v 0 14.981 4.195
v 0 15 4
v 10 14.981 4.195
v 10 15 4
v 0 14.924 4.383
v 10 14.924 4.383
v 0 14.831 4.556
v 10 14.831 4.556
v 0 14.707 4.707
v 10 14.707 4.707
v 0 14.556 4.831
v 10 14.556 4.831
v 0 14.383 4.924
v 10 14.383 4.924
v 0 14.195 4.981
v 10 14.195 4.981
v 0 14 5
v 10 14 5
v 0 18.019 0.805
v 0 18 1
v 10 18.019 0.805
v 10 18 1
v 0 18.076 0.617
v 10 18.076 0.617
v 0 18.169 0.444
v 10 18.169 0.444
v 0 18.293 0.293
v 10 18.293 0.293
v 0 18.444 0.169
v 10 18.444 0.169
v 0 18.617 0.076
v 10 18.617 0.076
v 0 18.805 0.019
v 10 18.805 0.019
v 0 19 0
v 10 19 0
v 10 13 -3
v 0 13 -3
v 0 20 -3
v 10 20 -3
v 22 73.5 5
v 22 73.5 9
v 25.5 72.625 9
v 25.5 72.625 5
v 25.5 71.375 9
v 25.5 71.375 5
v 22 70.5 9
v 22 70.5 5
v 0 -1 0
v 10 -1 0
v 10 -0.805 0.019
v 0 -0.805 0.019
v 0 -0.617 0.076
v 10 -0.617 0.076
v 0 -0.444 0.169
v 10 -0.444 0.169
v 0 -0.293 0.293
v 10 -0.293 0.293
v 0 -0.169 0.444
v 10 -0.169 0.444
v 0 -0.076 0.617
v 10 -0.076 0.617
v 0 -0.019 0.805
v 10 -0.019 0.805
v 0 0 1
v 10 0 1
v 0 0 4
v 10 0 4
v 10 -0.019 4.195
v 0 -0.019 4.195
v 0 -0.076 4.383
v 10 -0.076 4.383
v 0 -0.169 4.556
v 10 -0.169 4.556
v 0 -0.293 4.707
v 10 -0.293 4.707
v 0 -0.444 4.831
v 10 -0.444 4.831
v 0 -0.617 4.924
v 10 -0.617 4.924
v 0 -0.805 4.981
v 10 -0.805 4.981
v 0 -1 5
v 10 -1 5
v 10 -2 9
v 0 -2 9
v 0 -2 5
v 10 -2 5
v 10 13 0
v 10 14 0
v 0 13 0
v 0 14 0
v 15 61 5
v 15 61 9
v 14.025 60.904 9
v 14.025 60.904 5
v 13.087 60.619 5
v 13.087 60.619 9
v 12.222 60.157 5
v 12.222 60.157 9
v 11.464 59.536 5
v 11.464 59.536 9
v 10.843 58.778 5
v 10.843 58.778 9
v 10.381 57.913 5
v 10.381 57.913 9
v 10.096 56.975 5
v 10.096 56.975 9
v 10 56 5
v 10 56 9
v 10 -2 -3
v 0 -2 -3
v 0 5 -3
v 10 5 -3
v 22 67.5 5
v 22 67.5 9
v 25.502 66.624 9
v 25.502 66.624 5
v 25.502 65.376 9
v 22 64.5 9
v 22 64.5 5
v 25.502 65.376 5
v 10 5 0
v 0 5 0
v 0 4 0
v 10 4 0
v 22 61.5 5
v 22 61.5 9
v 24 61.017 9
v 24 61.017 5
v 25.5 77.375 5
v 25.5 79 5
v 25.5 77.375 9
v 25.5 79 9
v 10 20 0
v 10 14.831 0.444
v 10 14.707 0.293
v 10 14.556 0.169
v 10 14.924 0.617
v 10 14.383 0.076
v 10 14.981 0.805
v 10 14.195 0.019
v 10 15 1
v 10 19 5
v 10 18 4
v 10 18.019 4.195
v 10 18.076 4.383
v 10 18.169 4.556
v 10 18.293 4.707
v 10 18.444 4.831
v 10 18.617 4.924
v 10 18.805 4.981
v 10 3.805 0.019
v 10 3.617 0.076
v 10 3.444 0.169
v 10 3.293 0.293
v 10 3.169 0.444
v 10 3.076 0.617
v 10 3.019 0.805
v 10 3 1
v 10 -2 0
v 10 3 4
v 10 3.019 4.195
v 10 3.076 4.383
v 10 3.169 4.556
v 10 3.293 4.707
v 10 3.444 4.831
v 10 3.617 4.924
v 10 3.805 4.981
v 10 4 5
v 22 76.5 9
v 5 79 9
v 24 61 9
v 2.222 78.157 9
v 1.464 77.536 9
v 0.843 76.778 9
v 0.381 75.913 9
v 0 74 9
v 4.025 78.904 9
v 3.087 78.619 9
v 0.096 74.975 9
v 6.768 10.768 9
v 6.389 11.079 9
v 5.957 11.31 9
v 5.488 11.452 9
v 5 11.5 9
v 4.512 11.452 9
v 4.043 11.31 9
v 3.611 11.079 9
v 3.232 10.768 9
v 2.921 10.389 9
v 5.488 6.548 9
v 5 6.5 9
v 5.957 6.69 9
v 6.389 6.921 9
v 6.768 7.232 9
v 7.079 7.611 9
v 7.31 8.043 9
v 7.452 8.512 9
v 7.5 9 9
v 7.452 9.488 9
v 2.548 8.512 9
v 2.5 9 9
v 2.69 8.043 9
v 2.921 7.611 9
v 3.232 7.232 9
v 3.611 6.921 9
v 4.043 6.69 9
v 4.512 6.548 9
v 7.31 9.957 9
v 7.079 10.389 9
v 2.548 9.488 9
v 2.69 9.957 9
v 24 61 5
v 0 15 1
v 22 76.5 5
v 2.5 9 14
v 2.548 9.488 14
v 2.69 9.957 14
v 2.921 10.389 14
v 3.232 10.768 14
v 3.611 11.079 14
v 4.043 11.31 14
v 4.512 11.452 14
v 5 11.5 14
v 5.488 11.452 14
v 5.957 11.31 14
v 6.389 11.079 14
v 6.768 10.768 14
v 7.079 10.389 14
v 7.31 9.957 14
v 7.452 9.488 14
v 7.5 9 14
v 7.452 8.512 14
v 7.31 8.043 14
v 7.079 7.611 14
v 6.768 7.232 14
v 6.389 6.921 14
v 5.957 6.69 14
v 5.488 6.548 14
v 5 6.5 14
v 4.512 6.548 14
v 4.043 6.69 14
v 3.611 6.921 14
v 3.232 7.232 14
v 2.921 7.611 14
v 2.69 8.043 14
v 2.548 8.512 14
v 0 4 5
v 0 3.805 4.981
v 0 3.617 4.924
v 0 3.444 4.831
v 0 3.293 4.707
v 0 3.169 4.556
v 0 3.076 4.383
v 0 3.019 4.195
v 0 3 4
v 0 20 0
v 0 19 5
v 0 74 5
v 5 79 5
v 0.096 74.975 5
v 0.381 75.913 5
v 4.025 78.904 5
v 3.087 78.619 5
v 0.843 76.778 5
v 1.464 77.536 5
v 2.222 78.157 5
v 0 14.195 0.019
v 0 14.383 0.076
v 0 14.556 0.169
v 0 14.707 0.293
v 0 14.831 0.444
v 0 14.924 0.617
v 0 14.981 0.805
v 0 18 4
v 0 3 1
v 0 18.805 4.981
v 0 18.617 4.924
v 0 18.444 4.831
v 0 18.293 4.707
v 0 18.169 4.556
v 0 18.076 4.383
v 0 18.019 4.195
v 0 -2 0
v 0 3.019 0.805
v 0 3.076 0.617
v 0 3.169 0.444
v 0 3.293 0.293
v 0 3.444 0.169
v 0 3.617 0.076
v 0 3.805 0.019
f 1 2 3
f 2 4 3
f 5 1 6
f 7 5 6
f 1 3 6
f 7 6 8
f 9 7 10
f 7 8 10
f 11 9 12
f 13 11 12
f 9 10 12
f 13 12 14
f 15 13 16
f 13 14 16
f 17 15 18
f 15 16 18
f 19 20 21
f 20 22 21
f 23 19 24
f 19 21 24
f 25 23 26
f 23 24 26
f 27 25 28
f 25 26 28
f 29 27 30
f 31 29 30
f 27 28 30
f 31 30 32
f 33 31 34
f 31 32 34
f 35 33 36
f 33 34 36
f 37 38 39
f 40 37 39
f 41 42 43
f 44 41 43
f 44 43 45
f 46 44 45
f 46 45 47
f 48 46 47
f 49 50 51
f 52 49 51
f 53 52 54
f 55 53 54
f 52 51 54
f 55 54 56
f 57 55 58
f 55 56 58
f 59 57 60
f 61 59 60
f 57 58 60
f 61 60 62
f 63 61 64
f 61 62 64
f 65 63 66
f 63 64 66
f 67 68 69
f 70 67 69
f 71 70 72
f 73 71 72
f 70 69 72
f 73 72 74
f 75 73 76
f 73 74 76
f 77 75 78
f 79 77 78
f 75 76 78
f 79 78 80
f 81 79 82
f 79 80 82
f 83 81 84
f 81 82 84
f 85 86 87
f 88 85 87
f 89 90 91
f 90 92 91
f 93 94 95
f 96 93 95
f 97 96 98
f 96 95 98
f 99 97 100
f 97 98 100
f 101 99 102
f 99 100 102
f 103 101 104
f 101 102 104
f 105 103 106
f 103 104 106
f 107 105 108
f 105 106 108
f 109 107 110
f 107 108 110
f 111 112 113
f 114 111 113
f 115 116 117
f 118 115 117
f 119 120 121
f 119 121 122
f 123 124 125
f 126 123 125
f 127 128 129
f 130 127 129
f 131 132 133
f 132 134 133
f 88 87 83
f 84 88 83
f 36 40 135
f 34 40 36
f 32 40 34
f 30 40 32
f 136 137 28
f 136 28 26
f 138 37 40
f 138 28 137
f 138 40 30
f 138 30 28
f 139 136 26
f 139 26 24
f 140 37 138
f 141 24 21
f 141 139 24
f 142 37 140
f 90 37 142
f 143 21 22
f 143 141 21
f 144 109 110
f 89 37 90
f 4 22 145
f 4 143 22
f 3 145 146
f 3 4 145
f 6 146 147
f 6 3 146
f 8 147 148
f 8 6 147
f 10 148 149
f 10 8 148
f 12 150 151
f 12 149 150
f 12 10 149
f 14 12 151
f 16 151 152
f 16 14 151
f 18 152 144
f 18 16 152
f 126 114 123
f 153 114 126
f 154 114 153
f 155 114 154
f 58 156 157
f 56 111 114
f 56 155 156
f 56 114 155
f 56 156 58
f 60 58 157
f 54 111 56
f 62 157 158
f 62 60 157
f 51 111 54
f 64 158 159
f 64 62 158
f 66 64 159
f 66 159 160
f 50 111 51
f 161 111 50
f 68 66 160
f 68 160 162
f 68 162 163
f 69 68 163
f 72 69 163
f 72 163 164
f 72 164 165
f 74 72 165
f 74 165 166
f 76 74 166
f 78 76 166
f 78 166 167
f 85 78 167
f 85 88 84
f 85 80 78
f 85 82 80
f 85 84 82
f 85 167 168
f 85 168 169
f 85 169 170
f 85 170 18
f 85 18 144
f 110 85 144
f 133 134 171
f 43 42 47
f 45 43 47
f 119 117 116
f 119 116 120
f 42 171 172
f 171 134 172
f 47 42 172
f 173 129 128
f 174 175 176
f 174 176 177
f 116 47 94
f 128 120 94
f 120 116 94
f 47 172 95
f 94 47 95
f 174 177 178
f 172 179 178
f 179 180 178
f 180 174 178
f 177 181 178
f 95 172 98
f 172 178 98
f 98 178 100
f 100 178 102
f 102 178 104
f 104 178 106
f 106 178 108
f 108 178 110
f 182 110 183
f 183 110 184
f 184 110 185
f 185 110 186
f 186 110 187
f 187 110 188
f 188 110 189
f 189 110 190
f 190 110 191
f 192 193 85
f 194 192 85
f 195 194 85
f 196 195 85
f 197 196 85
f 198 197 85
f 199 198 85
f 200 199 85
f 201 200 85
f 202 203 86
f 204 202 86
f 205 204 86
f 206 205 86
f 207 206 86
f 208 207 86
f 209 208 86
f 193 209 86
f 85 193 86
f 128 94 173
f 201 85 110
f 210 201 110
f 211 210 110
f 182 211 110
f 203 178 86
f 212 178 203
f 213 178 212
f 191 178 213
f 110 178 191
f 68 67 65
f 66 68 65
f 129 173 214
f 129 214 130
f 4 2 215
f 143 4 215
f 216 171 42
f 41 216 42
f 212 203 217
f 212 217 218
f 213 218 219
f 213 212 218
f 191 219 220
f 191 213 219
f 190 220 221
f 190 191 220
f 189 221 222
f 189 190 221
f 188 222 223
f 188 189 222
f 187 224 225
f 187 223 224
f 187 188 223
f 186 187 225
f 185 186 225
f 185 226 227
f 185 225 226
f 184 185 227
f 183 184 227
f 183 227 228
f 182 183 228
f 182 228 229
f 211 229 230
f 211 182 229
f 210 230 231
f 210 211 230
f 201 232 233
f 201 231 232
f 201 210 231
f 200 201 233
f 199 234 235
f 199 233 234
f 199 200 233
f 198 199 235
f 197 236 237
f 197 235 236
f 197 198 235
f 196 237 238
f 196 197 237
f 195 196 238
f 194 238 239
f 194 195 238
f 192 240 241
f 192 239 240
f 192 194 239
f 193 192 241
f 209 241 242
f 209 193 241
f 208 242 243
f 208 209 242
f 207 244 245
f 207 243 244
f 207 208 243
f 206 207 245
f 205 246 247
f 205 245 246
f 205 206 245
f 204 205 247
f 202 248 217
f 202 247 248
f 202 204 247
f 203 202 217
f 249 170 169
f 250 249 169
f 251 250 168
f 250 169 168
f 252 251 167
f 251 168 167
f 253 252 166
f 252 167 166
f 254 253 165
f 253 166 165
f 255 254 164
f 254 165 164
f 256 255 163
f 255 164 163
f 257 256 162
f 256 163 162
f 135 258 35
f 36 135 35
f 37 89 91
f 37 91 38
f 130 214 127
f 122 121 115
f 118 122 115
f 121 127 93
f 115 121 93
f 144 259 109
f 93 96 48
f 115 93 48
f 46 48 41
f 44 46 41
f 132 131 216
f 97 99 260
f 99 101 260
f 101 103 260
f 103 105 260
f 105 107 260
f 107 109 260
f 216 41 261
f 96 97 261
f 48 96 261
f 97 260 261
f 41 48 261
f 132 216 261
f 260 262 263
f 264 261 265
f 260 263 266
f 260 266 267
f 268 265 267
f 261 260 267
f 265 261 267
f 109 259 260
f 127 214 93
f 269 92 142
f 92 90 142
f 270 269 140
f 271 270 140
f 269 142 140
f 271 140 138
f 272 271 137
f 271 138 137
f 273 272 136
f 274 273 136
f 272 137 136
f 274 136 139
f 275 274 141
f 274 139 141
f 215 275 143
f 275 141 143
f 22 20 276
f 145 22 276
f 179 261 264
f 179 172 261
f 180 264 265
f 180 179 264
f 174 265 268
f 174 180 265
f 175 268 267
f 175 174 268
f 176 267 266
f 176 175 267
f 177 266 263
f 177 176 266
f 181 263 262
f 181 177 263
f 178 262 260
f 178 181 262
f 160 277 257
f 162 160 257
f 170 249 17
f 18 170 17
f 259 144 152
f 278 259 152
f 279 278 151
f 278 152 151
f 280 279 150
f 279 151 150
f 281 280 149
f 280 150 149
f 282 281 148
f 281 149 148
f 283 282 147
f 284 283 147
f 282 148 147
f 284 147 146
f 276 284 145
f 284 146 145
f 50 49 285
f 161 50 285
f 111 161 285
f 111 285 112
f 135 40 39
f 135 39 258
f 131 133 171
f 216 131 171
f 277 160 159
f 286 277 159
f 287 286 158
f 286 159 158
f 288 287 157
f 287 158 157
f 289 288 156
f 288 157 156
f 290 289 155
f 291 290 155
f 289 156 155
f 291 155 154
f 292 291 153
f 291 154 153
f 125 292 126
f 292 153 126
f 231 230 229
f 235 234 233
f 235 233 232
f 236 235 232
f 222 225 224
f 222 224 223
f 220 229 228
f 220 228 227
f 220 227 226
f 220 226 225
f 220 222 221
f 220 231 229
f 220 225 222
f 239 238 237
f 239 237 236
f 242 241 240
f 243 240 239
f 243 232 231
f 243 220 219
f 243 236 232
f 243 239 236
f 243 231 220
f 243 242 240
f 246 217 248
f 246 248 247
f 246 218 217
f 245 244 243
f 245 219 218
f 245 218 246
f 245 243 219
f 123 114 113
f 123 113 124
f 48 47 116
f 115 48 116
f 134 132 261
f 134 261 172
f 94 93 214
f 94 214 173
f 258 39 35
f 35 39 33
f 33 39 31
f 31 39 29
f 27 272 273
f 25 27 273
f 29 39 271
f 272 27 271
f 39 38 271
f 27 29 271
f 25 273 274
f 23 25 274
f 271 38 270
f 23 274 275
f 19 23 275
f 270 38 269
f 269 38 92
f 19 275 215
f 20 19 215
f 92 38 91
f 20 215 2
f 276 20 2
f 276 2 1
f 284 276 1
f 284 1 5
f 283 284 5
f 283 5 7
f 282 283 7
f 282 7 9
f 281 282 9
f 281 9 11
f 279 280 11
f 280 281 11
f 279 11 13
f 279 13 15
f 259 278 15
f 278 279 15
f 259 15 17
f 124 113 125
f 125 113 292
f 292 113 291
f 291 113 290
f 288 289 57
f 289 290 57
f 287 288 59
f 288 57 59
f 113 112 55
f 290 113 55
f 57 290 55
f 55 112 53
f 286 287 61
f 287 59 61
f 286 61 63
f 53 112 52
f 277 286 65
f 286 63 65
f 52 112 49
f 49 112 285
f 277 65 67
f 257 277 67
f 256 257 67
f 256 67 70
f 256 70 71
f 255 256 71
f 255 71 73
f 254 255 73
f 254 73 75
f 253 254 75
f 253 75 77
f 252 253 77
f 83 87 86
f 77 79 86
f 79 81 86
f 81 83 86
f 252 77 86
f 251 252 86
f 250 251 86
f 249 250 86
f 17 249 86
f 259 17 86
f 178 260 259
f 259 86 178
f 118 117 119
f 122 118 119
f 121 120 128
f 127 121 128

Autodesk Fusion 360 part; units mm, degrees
sketch "Sketch1" plane through (0, 0, 0) normal (1, 0, 0) x (0, 1, 0)
  line L0 (0, 0) -> (0, 5) construction
  line L1 (0, 5) -> (3, 5) construction
  line L2 (3, 5) -> (3, 0) construction
  line L3 (3, 0) -> (0, 0) construction
  line L4 (0, 5) -> (-2, 5) construction
  line L5 (-2, 5) -> (-2, 9) construction
  line L6 (0, 0) -> (-2, 0) construction
  line L7 (-2, 0) -> (-2, -3) construction
  line L8 (-2, -3) -> (5, -3) construction
  line L9 (5, -3) -> (5, 0) construction
  line L10 (5, 0) -> (3, 0) construction
  line L11 (3, 5) -> (5, 5) construction
  line L12 (5, 5) -> (5, 9) construction
  line L13 (-2, 9) -> (5, 9) construction
  line L14 (-2, 5) -> (0, 5)
  line L15 (0, 5) -> (0, 0)
  line L16 (0, 0) -> (-2, 0)
  line L17 (-2, 0) -> (-2, -3)
  line L18 (-2, -3) -> (5, -3)
  line L19 (5, -3) -> (5, 0)
  line L20 (5, 0) -> (3, 0)
  line L21 (3, 0) -> (3, 5)
  line L22 (3, 5) -> (5, 5)
  line L23 (5, 5) -> (5, 9)
  line L24 (5, 9) -> (-2, 9)
  line L25 (-2, 9) -> (-2, 5)
  line L26 (-2, 5) -> (0, 5)
  line L27 (5, 9) -> (-2, 9)
  line L28 (-2, 0) -> (-2, -3)
  line L29 (3, 5) -> (5, 5) construction
  line L30 (5, 5) -> (5, 9) construction
  line L31 (5, 0) -> (3, 0)
  line L32 (-2, 0) -> (-2, -3) construction
  line L33 (5, 0) -> (3, 0) construction
  line L34 (-2, 9) -> (5, 9) construction
  line L35 (-2, -3) -> (5, -3) construction
  line L36 (-2, -3) -> (5, -3)
  line L37 (-2, 9) -> (-2, 5)
  line L38 (5, -3) -> (5, 0) construction
  line L39 (3, 5) -> (3, 0) construction
  line L40 (5, -3) -> (5, 0)
  line L41 (0, 0) -> (-2, 0)
  line L42 (3, 0) -> (3, 5)
  line L43 (0, 0) -> (-2, 0) construction
  line L44 (-2, 5) -> (-2, 9) construction
  line L45 (0, 5) -> (3, 5) construction
  line L46 (3, 5) -> (5, 5)
  line L47 (5, 5) -> (5, 9)
  line L48 (0, 0) -> (0, 5) construction
  line L49 (3, 0) -> (0, 0) construction
  line L50 (0, 5) -> (-2, 5) construction
  line L51 (0, 5) -> (0, 0)
  line L52 (13, 5) -> (15, 5)
  line L53 (20, 9) -> (13, 9)
  line L54 (13, 0) -> (13, -3)
  line L55 (18, 5) -> (20, 5) construction
  line L56 (20, 5) -> (20, 9) construction
  line L57 (20, 0) -> (18, 0)
  line L58 (13, 0) -> (13, -3) construction
  line L59 (20, 0) -> (18, 0) construction
  line L60 (13, 9) -> (20, 9) construction
  line L61 (13, -3) -> (20, -3) construction
  line L62 (13, -3) -> (20, -3)
  line L63 (13, 9) -> (13, 5)
  line L64 (20, -3) -> (20, 0) construction
  line L65 (18, 5) -> (18, 0) construction
  line L66 (20, -3) -> (20, 0)
  line L67 (15, 0) -> (13, 0)
  line L68 (18, 0) -> (18, 5)
  line L69 (15, 0) -> (13, 0) construction
  line L70 (13, 5) -> (13, 9) construction
  line L71 (15, 5) -> (18, 5) construction
  line L72 (18, 5) -> (20, 5)
  line L73 (20, 5) -> (20, 9)
  line L74 (15, 0) -> (15, 5) construction
  line L75 (18, 0) -> (15, 0) construction
  line L76 (15, 5) -> (13, 5) construction
  line L77 (15, 5) -> (15, 0)
  point P0 (15, 0)
  dimension "d1" = 5
  dimension "d2" = 3
  dimension "d3" = 2
  dimension "d4" = 4
  dimension "d5" = 3
  dimension "d6" = 2
  dimension "d7" = 4
  dimension "d8" = 5
  dimension "d9" = 3
  dimension "d10" = 2
  dimension "d11" = 4
  dimension "d12" = 3
  dimension "d13" = 2
  dimension "d14" = 4
  dimension "d15" = 5
  dimension "d16" = 3
  dimension "d17" = 2
  dimension "d18" = 4
  dimension "d19" = 3
  dimension "d20" = 2
  dimension "d21" = 4
extrude "Extrude1" add sketch "Sketch1" along normal blind 10 makes body 1 at (6.6667, 0.3333, -3) makes body 2 at (3.3333, 15.3333, -3)
extrude "Extrude2" add 1 faces at (3.3333, 5, 6.3333) along direction (0, 1, 0) blind 8 on bodies 1 bodies 1 2
fillet "Fillet1" radius 1 1 edges at (5, 18, 5) on bodies 1
fillet "Fillet2" radius 1 1 edges at (5, 18, 0) on bodies 1
fillet "Fillet3" radius 1 1 edges at (5, 15, 0) on bodies 1
fillet "Fillet4" radius 1 1 edges at (5, 15, 5) on bodies 1
fillet "Fillet5" radius 1 1 edges at (5, 3, 0) on bodies 1
fillet "Fillet6" radius 1 1 edges at (5, 0, 0) on bodies 1
fillet "Fillet7" radius 1 1 edges at (5, 0, 5) on bodies 1
fillet "Fillet8" radius 1 1 edges at (5, 3, 5) on bodies 1
extrude "Extrude3" add 1 faces at (3.3333, 20, 6.3333) along direction (0, 1, 0) blind 59 on bodies 1 bodies 1
sketch "Sketch2" plane through (0, 0, 9) normal (0, 0, 1) x (-1, 0, 0)
  line L0 (0, -5) -> (-10, -5)
  line L1 (-10, -5) -> (-10, -13)
  line L2 (-10, -13) -> (0, -13)
  line L3 (0, -13) -> (0, -5)
  line L4 (-5, -13) -> (-5, -9) construction
  circle A0 centre (-5, -9) radius 2.5
  dimension "d44" = 5
extrude "Extrude4" add sketch "Sketch2" along normal blind 5 contours A0 bodies 1
sketch "Sketch3" plane through (10, 0, 0) normal (1, 0, 0) x (0, 1, 0)
  line L0 (0, 4) -> (0, 1)
  arc A0 (-1, 0) -> (0, 1) centre (-1, 1) ccw
  line L1 (-1, 0) -> (-2, 0)
  line L2 (-2, 0) -> (-2, -3)
  line L3 (-2, -3) -> (5, -3)
  line L4 (5, -3) -> (5, 0)
  line L5 (5, 0) -> (4, 0)
  arc A1 (3, 1) -> (4, 0) centre (4, 1) ccw
  line L6 (3, 1) -> (3, 4)
  arc A2 (4, 5) -> (3, 4) centre (4, 4) ccw
  line L7 (4, 5) -> (14, 5)
  arc A3 (15, 4) -> (14, 5) centre (14, 4) ccw
  line L8 (15, 4) -> (15, 1)
  arc A4 (14, 0) -> (15, 1) centre (14, 1) ccw
  line L9 (14, 0) -> (13, 0)
  line L10 (13, 0) -> (13, -3)
  line L11 (13, -3) -> (20, -3)
  line L12 (20, -3) -> (20, 0)
  line L13 (20, 0) -> (19, 0)
  arc A5 (18, 1) -> (19, 0) centre (19, 1) ccw
  line L14 (18, 1) -> (18, 4)
  arc A6 (19, 5) -> (18, 4) centre (19, 4) ccw
  line L15 (19, 5) -> (79, 5)
  line L16 (79, 5) -> (79, 9)
  line L17 (79, 9) -> (20, 9)
  line L18 (20, 9) -> (13, 9)
  line L19 (13, 9) -> (5, 9)
  line L20 (5, 9) -> (-2, 9)
  line L21 (-2, 9) -> (-2, 5)
  line L22 (-2, 5) -> (-1, 5)
  arc A7 (0, 4) -> (-1, 5) centre (-1, 4) ccw
  line L23 (79, 5) -> (61, 5)
  line L24 (61, 5) -> (61, 9)
  line L25 (61, 9) -> (79, 9)
  line L26 (79, 9) -> (79, 5)
  dimension "d47" = 18
extrude "Extrude5" add sketch "Sketch3" along normal blind 14 contours L15 L16 L17 L23 L24 L25 L26 bodies 1
fillet "Fillet9" radius 5 1 edges at (10, 61, 7) on bodies 1
fillet "Fillet10" radius 5 1 edges at (0, 79, 7) on bodies 1
sketch "Sketch4" plane through (0, 0, 9) normal (0, 0, 1) x (-1, 0, 0)
  arc A0 (-5, -79) -> (0, -74) centre (-5, -74) ccw
  line L0 (0, -74) -> (0, -20)
  line L1 (0, -20) -> (-10, -20)
  line L2 (-10, -20) -> (-10, -56)
  arc A1 (-15, -61) -> (-10, -56) centre (-15, -56) ccw
  line L3 (-15, -61) -> (-24, -61)
  line L4 (-24, -61) -> (-24, -79)
  line L5 (-24, -79) -> (-5, -79)
  line L6 (-22, -79) -> (-26, -79) construction
  line L7 (-26, -79) -> (-26, -61) construction
  line L8 (-26, -61) -> (-22, -61) construction
  line L9 (-22, -61) -> (-22, -79) construction
  line L10 (-26, -79) -> (-26, -77) construction
  line L11 (-26, -77) -> (-22, -76) construction
  line L12 (-22, -74) -> (-26, -73) construction
  line L13 (-26, -71) -> (-22, -70) construction
  line L14 (-22, -68) -> (-26, -67) construction
  line L15 (-26, -65) -> (-22, -64) construction
  line L16 (-22, -62) -> (-26, -61) construction
  line L17 (-26, -77) -> (-26, -77.5) construction
  line L18 (-22, -76) -> (-22, -76.5) construction
  line L19 (-26, -79) -> (-25.5, -79) construction
  line L20 (-26, -77.5) -> (-22, -76.5) construction
  line L21 (-25.5, -79) -> (-25.5, -77.375) construction
  line L22 (-26, -73) -> (-26, -72.5) construction
  line L23 (-22, -73.5) -> (-26, -72.5) construction
  line L24 (-26, -71.5) -> (-22, -70.5) construction
  line L25 (-22, -67.5) -> (-26, -66.5) construction
  line L26 (-22, -64.5) -> (-26, -65.5) construction
  line L27 (-22, -61.5) -> (-26, -60.5) construction
  line L28 (-25.5009, -60.6248) -> (-25.5009, -61.1248) construction
  line L29 (-25.5, -79) -> (-25.5, -77.375)
  line L30 (-25.5, -77.375) -> (-22, -76.5)
  line L31 (-25.5, -72.625) -> (-25.5, -71.375)
  line L32 (-22, -73.5) -> (-25.5, -72.625)
  line L33 (-25.5, -71.375) -> (-22, -70.5)
  line L34 (-25.5022, -66.6245) -> (-25.5022, -65.3756)
  line L35 (-22, -67.5) -> (-25.5022, -66.6245)
  line L36 (-22, -64.5) -> (-25.5022, -65.3756)
  line L37 (-22, -61.5) -> (-24.0719, -61)
  line L38 (-25.5, -79) -> (-22, -79)
  line L39 (-22, -79) -> (-22, -76.5)
  line L40 (-22, -73.5) -> (-22, -70.5)
  line L41 (-22, -67.5) -> (-22, -64.5)
  line L42 (-22, -61.5) -> (-22, -61)
  line L43 (-22, -61) -> (-24, -61)
  line L44 (-22, -70.5) -> (-22, -67.5)
  line L45 (-24, -71) -> (-24, -67)
  line L46 (-24, -65) -> (-24, -61)
  line L47 (-22, -64.5) -> (-22, -61.5)
  line L48 (-22, -76.5) -> (-22, -73.5)
  line L49 (-24, -77) -> (-24, -73)
  dimension "d54" = 0.5
  dimension "d55" = 0.5
extrude "Extrude6" add sketch "Sketch4" against normal blind 4 contours L4 L29 L30 L38 | L4 L31 L32 L33 | L4 L34 L35 L36 bodies 1
extrude "Extrude7" cut sketch "Sketch4" against normal blind 4 contours L4 L30 L32 L48 L49 | L4 L33 L35 L44 L45 | L4 L36 L37 L46 L47 bodies 1
